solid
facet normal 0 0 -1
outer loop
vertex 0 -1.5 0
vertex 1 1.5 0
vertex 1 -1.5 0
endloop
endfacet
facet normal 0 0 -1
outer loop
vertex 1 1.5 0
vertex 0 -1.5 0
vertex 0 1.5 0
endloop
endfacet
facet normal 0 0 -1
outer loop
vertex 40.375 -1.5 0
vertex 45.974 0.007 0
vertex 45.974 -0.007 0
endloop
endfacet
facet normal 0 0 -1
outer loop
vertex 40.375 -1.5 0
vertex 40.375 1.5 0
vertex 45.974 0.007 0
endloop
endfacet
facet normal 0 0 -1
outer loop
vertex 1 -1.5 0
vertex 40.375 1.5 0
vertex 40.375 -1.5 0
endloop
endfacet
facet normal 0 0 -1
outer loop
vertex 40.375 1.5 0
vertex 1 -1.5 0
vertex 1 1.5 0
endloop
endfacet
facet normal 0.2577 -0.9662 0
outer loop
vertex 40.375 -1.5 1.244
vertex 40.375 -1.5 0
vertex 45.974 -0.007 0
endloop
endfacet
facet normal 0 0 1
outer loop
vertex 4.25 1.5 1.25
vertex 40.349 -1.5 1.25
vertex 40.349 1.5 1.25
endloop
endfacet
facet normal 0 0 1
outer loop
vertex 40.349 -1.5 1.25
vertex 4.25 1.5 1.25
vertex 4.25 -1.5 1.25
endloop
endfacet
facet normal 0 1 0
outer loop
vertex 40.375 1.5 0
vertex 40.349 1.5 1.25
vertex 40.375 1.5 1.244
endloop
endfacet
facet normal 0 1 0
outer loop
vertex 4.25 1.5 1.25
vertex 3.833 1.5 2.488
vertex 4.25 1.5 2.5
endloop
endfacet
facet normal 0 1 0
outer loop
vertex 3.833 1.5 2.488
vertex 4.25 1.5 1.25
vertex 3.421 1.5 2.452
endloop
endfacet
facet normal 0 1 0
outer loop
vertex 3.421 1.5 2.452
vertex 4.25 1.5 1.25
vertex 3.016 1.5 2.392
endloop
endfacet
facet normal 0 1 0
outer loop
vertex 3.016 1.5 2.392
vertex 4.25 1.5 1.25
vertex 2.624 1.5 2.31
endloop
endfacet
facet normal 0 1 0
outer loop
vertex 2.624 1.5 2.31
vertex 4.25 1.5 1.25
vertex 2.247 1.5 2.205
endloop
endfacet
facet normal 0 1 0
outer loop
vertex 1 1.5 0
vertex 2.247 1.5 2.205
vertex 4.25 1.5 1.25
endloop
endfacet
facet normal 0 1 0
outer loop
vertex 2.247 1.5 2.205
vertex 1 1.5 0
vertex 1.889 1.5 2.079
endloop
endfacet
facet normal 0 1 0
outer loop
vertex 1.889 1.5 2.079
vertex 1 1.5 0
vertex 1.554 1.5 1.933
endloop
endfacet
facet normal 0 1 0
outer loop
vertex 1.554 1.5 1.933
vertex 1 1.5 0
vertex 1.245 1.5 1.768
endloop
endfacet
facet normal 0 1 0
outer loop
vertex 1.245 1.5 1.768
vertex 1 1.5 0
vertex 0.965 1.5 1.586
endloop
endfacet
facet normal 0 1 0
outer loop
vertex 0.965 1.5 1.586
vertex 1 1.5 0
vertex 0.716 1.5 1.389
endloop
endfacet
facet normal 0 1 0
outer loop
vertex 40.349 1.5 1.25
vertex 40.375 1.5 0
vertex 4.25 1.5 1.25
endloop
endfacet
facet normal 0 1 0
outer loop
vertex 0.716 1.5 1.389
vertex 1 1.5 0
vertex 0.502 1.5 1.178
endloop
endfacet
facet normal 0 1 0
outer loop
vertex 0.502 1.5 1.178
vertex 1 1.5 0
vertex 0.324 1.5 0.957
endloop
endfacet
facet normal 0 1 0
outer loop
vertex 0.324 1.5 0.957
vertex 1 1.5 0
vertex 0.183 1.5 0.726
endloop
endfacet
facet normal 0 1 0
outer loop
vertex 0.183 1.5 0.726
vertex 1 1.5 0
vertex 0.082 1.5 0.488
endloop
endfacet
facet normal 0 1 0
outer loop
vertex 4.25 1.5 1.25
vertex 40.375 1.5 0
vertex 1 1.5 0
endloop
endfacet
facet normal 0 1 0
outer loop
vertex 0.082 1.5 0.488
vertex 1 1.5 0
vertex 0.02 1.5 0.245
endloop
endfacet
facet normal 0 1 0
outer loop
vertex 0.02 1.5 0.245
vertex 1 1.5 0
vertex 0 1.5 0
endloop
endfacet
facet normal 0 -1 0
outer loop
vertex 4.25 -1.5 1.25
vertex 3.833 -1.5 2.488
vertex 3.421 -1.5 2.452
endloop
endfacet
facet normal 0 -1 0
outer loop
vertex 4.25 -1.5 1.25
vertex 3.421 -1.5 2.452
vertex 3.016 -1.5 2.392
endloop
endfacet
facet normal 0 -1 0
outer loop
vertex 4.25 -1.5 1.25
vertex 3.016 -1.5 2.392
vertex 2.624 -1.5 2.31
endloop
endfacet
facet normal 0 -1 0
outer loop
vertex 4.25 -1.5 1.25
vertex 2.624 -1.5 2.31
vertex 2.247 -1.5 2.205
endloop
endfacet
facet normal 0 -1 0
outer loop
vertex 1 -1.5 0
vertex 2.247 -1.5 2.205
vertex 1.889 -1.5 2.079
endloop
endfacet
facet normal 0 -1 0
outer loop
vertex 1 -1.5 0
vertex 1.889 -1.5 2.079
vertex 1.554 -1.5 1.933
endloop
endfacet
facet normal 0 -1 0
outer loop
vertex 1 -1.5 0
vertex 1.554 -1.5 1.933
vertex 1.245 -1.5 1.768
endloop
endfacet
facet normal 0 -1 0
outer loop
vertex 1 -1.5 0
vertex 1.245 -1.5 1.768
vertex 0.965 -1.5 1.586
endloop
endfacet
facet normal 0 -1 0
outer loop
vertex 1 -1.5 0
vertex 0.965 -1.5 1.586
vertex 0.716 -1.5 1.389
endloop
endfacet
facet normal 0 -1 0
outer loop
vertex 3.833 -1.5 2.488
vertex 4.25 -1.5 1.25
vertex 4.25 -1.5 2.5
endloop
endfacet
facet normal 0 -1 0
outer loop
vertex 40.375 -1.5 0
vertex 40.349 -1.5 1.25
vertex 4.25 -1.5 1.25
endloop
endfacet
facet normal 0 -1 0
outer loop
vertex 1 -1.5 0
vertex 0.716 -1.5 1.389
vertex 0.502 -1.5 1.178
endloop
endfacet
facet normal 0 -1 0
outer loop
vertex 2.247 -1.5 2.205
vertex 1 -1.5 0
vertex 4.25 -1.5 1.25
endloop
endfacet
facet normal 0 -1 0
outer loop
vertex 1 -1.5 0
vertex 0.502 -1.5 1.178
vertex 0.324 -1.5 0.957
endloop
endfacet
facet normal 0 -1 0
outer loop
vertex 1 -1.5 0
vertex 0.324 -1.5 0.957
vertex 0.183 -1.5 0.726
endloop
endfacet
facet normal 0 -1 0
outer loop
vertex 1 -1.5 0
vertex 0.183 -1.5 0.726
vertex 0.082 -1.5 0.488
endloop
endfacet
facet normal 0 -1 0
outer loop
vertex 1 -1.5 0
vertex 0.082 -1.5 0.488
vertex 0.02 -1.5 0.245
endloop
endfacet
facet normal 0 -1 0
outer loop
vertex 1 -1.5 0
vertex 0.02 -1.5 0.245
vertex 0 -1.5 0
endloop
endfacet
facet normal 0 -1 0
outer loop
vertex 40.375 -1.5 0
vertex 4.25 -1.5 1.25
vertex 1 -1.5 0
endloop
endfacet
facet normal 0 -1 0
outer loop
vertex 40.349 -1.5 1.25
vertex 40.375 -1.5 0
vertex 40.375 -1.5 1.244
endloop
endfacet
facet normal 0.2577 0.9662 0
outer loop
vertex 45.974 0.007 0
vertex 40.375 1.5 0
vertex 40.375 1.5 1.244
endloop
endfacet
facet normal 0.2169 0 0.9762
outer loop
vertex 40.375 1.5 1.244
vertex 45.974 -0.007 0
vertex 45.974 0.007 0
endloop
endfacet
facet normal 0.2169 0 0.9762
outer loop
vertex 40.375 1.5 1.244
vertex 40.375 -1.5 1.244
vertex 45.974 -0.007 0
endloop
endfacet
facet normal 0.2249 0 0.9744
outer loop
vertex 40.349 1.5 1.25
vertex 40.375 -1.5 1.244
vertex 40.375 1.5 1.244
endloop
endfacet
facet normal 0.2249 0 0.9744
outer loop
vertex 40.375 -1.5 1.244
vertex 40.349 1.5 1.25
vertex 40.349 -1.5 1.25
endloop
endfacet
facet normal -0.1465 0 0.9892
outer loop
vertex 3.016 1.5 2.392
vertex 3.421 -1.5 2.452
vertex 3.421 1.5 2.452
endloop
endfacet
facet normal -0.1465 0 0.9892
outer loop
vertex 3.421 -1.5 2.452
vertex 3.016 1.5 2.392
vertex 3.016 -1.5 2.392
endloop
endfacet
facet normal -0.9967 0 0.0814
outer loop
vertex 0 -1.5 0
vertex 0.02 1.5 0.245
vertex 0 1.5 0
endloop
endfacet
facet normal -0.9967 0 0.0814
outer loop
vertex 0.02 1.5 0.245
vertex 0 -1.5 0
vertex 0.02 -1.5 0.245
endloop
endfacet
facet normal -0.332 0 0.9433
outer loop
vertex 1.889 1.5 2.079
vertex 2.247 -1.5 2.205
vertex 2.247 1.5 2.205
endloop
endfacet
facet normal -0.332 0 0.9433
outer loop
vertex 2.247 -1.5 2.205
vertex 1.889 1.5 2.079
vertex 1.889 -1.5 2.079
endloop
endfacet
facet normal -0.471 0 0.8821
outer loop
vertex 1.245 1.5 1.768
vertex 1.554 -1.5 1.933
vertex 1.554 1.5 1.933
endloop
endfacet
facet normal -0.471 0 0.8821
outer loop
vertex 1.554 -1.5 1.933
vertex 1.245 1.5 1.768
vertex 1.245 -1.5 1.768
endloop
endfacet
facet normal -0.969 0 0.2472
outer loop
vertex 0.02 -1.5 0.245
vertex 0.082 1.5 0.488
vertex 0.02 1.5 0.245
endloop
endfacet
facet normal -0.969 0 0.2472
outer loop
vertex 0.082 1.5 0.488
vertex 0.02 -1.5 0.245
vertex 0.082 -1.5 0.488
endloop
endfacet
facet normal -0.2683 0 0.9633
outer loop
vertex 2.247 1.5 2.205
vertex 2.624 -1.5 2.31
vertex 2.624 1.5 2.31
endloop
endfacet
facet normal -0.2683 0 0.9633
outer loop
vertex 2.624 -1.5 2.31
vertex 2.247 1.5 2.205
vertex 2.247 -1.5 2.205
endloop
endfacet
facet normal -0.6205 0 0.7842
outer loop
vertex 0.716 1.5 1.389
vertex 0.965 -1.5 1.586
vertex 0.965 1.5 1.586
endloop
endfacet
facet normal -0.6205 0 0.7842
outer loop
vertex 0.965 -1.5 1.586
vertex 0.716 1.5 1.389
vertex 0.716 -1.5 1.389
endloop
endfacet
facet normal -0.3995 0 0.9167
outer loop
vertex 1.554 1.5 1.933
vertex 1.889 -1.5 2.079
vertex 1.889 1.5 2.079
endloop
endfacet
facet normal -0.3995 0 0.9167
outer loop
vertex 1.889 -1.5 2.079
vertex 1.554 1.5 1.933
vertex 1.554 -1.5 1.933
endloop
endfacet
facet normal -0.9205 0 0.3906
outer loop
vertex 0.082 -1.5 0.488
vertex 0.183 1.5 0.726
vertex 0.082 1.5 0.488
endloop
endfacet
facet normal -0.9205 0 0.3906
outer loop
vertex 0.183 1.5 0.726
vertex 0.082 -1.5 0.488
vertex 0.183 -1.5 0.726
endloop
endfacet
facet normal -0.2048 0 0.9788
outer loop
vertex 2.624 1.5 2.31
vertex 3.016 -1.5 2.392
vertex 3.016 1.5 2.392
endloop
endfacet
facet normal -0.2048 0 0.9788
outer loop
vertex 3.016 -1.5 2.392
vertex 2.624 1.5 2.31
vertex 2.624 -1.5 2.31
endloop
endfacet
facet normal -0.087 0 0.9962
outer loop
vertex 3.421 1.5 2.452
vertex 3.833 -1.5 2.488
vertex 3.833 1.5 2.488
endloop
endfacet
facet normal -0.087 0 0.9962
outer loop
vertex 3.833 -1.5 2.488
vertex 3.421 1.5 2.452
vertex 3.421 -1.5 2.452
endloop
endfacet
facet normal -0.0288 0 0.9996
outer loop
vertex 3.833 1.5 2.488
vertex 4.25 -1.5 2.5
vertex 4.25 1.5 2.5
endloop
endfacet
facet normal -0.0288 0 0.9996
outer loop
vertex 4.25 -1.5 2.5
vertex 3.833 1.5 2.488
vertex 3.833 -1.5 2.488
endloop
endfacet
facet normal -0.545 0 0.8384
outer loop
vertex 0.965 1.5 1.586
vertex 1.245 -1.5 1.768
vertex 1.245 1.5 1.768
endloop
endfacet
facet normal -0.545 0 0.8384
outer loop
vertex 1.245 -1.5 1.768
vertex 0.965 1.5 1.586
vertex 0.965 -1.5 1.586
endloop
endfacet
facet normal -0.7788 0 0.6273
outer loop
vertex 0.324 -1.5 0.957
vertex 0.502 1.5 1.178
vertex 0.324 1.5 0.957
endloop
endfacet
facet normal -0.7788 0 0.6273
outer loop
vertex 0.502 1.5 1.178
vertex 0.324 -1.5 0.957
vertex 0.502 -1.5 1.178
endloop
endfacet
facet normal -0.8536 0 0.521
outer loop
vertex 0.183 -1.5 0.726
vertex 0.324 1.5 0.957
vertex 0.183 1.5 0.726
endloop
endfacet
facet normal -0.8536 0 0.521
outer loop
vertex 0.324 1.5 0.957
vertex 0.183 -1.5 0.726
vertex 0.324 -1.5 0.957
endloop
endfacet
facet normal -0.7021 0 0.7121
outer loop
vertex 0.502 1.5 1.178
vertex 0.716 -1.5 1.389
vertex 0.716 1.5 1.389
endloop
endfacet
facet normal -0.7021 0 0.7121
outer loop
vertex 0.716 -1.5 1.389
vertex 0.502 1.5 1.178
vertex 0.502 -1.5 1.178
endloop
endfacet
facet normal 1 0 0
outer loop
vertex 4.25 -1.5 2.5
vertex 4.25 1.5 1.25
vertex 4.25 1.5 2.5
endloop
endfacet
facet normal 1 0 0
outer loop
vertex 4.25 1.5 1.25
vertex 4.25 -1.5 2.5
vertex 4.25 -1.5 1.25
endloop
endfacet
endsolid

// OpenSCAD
// Swiss Army Knife Toothpick

pick_len = 45.0;
pick_wid = 3.0;
pick_thick = 1.25;
head_thick = 2.5;
head_len = 4.25;
point_ratio = 8.0;

module pickShaft3D() {
    difference() {
    linear_extrude(pick_thick)
    polygon([
        [0, pick_wid/2],[(point_ratio-1)*pick_len/point_ratio, pick_wid/2],
        [pick_len, 0],
        [(point_ratio-1)*pick_len/point_ratio, -pick_wid/2], [0, -pick_wid/2]
    ]);
    translate([5+(point_ratio-1)*pick_len/point_ratio,0,pick_thick/2+4.63])
    rotate([0,atan2(pick_thick, pick_len/point_ratio),0])
    #cube([pick_len/point_ratio+5, 10, 10], center=true);
    }
}

module pickHead3D() {
    difference() {
        translate([head_len,0,0])
        rotate([90,0,0])
        scale([head_len/head_thick, 1, 1])
        cylinder(r=head_thick, h=pick_wid, $fn = 64, center=true);
        translate([0,0,-10])
        cube([100, 100, 20], center=true);
        translate([head_len+5,0,5])
        cube([10, 10, 10], center=true);
    }
}

translate([1,0,0])
pickShaft3D();
pickHead3D();
